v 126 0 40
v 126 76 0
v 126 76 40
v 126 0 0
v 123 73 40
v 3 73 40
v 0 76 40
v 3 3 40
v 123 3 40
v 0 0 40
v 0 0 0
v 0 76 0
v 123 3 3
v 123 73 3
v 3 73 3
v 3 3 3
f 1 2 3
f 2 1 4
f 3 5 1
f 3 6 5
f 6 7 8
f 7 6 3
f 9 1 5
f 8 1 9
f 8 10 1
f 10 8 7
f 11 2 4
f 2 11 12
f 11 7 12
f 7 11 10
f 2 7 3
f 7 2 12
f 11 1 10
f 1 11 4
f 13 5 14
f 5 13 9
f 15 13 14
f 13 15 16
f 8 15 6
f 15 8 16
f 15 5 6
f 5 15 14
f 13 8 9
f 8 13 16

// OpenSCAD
// Open-top storage bin / parts tray - a rectangular box open at the top, for small parts
// or bench organisation. NOVEL general part.
//
// @desc open-top storage bin / parts tray
// @prompt Design an open-top storage bin in OpenSCAD: {inner_l} by {inner_w} mm inside and {height} mm tall, with {wall} mm walls and a solid floor. Reply with a single complete OpenSCAD file.
// @param inner_l inner length, mm      [30:200]
// @param inner_w inner width, mm       [30:150]
// @param height  height, mm            [15:120]
// @param wall    wall thickness, mm    [1.6:4]

inner_l = 120;
inner_w = 70;
height  = 40;
wall    = 3;

difference() {
    cube([inner_l + 2 * wall, inner_w + 2 * wall, height]);
    translate([wall, wall, wall]) cube([inner_l, inner_w, height]);     // hollow, open top
}
